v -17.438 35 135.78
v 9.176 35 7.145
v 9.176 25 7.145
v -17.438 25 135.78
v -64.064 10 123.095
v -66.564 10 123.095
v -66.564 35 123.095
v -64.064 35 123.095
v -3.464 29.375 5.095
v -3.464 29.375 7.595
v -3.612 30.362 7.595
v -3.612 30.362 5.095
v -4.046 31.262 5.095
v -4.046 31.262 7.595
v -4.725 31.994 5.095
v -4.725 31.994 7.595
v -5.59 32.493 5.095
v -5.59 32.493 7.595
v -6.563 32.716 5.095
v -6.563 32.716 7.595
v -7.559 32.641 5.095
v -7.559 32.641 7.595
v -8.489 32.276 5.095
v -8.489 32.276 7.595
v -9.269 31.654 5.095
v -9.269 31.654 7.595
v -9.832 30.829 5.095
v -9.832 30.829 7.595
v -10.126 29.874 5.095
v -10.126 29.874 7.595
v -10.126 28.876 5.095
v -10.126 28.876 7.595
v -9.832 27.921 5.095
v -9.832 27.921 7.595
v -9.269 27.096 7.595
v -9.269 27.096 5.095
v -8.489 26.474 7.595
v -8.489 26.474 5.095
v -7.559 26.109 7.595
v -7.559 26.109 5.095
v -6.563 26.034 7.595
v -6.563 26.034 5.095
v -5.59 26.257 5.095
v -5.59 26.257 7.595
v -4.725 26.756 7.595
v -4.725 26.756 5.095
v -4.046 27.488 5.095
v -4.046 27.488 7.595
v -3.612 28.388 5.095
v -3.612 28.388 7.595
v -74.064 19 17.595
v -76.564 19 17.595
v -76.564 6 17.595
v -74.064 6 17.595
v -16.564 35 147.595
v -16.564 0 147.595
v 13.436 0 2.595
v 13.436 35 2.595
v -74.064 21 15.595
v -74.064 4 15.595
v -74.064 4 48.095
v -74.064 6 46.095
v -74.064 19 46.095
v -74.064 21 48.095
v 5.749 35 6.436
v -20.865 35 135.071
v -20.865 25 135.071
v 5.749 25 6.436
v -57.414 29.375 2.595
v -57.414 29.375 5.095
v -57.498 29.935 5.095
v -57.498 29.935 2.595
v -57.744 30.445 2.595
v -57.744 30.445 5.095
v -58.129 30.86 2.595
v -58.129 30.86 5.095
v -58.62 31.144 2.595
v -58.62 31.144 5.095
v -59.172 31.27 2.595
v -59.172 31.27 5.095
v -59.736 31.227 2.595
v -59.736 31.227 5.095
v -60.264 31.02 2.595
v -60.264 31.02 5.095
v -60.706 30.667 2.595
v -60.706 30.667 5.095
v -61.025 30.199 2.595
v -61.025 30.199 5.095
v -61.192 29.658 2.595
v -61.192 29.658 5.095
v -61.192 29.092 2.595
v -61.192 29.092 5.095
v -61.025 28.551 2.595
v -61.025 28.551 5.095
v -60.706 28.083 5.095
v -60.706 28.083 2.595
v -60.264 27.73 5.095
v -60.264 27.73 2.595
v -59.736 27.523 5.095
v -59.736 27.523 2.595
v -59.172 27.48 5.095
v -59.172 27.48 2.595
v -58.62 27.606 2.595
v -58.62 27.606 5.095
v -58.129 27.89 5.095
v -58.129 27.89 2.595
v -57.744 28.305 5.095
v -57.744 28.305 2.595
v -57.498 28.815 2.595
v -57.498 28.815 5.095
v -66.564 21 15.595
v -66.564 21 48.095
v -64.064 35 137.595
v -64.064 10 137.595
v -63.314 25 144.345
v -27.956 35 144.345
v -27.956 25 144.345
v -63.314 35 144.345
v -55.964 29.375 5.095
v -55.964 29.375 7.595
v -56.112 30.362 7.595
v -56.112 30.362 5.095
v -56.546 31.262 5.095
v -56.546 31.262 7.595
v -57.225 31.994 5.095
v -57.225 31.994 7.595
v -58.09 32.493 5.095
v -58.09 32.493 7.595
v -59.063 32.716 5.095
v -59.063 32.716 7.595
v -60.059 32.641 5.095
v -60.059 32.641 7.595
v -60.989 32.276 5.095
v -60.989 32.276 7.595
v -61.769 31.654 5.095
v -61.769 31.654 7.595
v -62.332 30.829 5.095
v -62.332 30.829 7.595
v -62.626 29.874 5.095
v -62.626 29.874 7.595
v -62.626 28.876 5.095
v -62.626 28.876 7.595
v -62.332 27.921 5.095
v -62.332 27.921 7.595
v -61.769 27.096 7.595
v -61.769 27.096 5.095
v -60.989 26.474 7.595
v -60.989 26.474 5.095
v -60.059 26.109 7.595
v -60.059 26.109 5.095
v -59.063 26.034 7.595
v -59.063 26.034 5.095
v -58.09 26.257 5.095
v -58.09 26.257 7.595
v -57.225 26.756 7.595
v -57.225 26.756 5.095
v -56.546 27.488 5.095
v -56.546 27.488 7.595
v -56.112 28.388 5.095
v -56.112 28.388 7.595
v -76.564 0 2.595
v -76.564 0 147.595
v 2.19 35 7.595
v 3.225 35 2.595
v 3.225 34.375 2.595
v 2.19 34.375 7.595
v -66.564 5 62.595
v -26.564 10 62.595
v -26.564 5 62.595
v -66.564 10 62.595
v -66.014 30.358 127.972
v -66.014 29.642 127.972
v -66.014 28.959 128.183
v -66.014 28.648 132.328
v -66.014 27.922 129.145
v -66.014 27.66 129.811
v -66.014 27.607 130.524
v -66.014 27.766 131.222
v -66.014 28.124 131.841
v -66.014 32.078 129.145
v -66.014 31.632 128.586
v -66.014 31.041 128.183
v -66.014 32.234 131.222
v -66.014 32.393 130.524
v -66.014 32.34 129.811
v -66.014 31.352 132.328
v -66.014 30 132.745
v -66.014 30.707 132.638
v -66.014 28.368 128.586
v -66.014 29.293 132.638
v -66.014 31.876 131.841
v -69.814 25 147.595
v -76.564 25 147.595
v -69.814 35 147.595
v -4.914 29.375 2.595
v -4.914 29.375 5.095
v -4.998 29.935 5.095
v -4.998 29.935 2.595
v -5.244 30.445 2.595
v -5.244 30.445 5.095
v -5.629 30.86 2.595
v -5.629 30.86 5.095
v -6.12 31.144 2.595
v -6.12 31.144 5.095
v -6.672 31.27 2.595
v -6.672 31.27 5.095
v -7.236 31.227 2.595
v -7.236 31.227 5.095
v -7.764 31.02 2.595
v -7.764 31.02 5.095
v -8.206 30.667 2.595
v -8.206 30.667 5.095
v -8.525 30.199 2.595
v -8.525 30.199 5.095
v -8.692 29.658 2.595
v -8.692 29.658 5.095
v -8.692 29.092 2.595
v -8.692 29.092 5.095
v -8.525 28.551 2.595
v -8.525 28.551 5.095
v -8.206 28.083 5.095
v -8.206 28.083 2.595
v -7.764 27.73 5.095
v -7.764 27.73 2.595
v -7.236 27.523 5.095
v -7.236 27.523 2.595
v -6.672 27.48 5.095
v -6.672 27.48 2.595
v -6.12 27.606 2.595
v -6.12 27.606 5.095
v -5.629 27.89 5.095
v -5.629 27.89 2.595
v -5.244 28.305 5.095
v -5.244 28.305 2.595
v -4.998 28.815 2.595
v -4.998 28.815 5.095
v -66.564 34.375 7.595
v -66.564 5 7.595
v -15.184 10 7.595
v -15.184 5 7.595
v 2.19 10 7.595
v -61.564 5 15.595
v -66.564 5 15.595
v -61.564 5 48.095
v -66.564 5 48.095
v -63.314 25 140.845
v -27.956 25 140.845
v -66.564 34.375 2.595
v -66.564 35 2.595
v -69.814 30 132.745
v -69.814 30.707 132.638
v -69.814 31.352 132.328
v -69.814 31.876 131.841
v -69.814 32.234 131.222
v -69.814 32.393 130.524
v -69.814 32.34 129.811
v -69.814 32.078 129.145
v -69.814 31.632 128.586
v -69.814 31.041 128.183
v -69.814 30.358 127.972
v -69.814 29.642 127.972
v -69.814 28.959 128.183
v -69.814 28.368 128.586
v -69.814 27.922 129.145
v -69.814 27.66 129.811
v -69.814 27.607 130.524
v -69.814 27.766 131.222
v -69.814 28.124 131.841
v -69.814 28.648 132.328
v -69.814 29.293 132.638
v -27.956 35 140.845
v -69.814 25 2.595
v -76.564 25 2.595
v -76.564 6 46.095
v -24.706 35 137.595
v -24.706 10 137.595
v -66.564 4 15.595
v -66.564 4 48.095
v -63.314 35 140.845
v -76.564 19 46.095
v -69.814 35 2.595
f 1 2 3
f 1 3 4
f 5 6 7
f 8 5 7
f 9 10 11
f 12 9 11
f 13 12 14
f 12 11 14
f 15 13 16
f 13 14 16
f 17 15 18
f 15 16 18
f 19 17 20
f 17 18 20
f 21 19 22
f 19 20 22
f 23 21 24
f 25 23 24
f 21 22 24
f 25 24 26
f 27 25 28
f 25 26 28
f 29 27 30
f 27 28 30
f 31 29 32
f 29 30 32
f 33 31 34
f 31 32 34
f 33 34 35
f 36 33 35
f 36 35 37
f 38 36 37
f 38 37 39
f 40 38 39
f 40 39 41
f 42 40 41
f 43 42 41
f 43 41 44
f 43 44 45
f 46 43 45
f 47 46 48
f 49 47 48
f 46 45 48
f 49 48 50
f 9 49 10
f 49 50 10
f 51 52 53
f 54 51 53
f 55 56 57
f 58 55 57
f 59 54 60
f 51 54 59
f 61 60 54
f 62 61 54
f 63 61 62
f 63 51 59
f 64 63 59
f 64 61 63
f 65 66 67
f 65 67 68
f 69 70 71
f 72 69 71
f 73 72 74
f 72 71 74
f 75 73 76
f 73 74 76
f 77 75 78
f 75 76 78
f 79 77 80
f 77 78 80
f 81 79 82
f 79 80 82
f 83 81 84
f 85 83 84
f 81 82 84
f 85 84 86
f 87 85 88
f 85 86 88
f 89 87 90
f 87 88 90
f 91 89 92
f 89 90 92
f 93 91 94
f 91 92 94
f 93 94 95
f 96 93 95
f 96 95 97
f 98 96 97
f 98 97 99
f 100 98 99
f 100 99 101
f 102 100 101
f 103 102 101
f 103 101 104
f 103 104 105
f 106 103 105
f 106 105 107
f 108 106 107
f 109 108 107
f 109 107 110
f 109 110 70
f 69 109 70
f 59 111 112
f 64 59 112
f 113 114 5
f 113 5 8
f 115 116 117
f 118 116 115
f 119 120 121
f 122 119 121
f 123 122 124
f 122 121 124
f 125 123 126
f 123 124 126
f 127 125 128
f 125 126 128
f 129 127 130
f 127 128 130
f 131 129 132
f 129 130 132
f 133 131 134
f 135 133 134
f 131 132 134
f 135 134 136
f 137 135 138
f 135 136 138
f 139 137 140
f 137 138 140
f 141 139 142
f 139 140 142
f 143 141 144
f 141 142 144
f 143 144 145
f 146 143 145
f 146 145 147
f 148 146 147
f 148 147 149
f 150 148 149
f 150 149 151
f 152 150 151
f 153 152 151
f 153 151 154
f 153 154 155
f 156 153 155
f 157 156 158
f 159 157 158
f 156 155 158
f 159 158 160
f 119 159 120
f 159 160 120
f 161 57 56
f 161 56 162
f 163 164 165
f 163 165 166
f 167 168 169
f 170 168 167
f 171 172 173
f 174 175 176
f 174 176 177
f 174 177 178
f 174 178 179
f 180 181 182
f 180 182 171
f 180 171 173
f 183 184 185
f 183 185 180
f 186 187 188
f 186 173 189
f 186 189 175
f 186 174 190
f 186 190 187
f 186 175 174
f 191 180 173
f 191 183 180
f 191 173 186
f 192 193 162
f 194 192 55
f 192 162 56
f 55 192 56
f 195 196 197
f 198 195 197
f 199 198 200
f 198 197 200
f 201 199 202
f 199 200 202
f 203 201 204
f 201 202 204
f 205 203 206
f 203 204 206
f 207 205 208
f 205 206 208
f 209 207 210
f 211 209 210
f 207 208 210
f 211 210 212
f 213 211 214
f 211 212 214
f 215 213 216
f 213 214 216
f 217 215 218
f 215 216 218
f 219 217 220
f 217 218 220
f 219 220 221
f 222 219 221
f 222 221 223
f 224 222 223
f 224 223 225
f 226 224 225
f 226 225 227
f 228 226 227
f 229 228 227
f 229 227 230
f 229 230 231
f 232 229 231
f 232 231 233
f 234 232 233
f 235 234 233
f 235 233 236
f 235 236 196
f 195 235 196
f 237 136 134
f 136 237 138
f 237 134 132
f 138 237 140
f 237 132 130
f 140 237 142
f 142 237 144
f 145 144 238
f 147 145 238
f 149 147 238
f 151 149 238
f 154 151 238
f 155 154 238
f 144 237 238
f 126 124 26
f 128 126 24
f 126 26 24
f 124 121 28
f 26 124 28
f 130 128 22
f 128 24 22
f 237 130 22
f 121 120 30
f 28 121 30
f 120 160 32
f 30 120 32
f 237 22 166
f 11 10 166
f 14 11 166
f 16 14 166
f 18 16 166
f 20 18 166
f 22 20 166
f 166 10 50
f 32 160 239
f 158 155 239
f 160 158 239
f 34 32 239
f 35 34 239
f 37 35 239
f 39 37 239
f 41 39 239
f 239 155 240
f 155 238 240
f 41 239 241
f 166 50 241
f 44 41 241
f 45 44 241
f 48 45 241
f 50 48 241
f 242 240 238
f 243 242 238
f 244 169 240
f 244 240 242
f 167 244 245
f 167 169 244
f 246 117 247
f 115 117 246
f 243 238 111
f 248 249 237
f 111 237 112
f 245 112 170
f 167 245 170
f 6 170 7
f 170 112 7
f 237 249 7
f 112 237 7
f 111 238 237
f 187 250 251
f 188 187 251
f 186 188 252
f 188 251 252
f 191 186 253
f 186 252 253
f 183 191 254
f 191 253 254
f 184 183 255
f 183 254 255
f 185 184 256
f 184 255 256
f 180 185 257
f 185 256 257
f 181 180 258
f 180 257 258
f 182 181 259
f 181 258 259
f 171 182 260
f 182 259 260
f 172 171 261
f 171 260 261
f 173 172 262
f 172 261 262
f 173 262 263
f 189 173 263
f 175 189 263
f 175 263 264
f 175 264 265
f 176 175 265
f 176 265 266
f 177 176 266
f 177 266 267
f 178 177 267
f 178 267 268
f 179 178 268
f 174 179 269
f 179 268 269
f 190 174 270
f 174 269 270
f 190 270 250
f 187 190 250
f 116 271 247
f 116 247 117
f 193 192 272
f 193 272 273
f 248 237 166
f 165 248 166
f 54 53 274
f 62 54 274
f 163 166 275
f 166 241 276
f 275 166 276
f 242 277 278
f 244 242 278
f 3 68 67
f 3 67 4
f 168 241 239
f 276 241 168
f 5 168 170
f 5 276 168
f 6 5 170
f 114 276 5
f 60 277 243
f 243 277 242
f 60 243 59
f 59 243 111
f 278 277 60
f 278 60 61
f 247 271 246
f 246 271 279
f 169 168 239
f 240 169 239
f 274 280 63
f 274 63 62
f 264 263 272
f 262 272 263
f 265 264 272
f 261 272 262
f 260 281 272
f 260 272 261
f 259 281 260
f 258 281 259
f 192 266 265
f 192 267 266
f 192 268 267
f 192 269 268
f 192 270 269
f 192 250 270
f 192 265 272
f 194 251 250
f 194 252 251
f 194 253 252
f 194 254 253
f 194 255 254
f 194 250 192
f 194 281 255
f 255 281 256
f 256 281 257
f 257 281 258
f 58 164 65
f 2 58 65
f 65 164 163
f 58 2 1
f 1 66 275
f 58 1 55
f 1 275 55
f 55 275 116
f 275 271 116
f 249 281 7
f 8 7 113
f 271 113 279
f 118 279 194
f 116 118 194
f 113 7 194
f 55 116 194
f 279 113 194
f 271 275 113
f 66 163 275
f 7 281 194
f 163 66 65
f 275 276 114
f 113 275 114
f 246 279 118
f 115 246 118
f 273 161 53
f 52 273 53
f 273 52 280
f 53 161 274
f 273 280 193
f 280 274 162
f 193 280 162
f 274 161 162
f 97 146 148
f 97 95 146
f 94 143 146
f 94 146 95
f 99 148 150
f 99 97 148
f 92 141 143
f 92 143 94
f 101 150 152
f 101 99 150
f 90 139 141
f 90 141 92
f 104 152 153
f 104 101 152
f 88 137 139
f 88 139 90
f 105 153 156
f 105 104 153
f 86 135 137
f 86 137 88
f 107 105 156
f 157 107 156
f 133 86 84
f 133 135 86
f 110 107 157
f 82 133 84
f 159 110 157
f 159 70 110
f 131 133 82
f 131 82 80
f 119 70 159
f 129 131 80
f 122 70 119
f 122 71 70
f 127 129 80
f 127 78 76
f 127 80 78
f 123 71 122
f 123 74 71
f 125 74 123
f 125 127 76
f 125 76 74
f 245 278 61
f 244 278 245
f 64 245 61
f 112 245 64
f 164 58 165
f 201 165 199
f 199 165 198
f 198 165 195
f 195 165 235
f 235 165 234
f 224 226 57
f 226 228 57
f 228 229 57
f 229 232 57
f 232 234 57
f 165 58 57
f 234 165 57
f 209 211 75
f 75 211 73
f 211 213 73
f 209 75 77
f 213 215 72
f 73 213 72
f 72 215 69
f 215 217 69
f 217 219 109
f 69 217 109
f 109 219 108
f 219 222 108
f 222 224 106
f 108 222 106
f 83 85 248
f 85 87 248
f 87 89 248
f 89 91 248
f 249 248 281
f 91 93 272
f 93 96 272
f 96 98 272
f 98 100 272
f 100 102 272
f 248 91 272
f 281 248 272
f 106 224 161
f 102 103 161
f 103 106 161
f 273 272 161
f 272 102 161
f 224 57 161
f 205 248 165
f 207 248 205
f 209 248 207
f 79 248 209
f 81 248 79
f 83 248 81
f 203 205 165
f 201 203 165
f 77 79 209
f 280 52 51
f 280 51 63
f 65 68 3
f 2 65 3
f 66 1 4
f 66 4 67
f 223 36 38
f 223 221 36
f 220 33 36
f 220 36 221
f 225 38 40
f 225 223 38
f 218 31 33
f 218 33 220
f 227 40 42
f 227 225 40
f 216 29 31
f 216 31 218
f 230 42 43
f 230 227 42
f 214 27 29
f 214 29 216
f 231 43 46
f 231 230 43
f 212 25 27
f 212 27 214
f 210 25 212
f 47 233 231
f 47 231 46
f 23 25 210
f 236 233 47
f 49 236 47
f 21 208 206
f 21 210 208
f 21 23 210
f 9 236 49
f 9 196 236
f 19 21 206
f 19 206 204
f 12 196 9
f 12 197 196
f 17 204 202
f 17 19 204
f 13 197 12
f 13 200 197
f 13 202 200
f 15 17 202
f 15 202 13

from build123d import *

# Parameters (mm, degrees)
BOSS_EXTRUDE1_DEPTH = 35
BOSS_EXTRUDE2_DEPTH = 10
SKETCH4_W           = 35.357177314
SKETCH4_H           = 3.5
CUT_EXTRUDE1_DEPTH  = 10
SKETCH5_W           = 68.753729038
SKETCH5_H           = 5
CUT_EXTRUDE2_DEPTH  = 0.625
CUT_EXTRUDE3_REACH  = 165.362
SKETCH6_R           = 1.9
SKETCH7_R           = 3.35
CUT_EXTRUDE4_DEPTH  = 2.5
LPATTERN1_COUNT     = 2
LPATTERN1_PITCH     = 52.5
SKETCH8_W           = 3.5
SKETCH8_H           = 145
SKETCH8_W_2         = 3.25
CUT_EXTRUDE5_DEPTH  = 10
SKETCH10_W          = 40
SKETCH10_H          = 55
CUT_EXTRUDE6_DEPTH  = 5
CUT_EXTRUDE7_REACH  = 178.378
SKETCH9_W           = 13
SKETCH9_H           = 28.5
SKETCH11_W          = 17
SKETCH11_H          = 32.5
SKETCH11_W_2        = 13
SKETCH11_H_2        = 28.5
CUT_EXTRUDE8_DEPTH  = 7.5
CHAMFER1_SIZE2      = 1
CHAMFER1_SIZE       = 5
SKETCH14_W          = 25
SKETCH14_H          = 14.5
BOSS_EXTRUDE3_DEPTH = 2.5
SKETCH13_R          = 2.4
CUT_EXTRUDE9_DEPTH  = 3.8


with BuildPart() as part:
    # Sketch1 → Boss-Extrude1 (new body)
    with BuildSketch(Plane(origin=(0, 0, 0), x_dir=(-1, 0, 0), z_dir=(0, 1, 0))):
        Polygon((66.563657866, 147.59508075), (16.563657866, 147.59508075), (26.356262061, 145.56902471), (24.706480552, 137.59508075), (66.563657866, 137.59508075), align=None)
        Polygon((26.356262061, 145.56902471), (16.563657866, 147.59508075), (16.563657866, 137.59508075), (24.706480552, 137.59508075), align=None)
        Polygon((16.563657866, 147.59508075), (-13.436342134, 2.59508075), (-8.436342134, 2.59508075), (-3.224553931, 2.59508075), (-3.224553931, 7.59508075), (-2.190071172, 7.59508075), (24.706480552, 137.59508075), (16.563657866, 137.59508075), align=None)
        Polygon((76.563657866, 147.59508075), (66.563657866, 147.59508075), (66.563657866, 137.59508075), (66.563657866, 7.59508075), (66.563657866, 2.59508075), (76.563657866, 2.59508075), align=None)
        Polygon((-3.224553931, 7.59508075), (-3.224553931, 2.59508075), (-2.190071172, 7.59508075), align=None)
        Polygon((-2.190071172, 7.59508075), (-3.224553931, 2.59508075), (66.563657866, 2.59508075), (66.563657866, 7.59508075), align=None)
    extrude(amount=BOSS_EXTRUDE1_DEPTH)

    # Sketch3 → Boss-Extrude2 (add)
    with BuildSketch(Plane.XZ):
        Polygon((-76.563657866, 147.59508075), (-16.563657866, 147.59508075), (13.436342134, 2.59508075), (-76.563657866, 2.59508075), align=None)
    extrude(amount=-BOSS_EXTRUDE2_DEPTH)

    # Sketch4 → Cut-Extrude1 (cut)
    with BuildSketch(Plane(origin=(0, 35, 0), x_dir=(-1, 0, 0), z_dir=(0, 1, 0))):
        Polygon((20.865415976, 135.0709526), (-5.748682081, 6.436145326), (-9.176093549, 7.145264941), (17.438004507, 135.780072214), align=None)
        with Locations((45.635069209, 142.59508075)):
            Rectangle(SKETCH4_W, SKETCH4_H)
    extrude(amount=-CUT_EXTRUDE1_DEPTH, mode=Mode.SUBTRACT)

    # Sketch5 → Cut-Extrude2 (cut)
    with BuildSketch(Plane(origin=(0, 35, -3.02991925), x_dir=(1, 0, 0), z_dir=(0, -1, 0))):
        Polygon((3.224553931, 5.625), (2.190071172, 10.625), (2.190071172, 5.625), align=None)
        with Locations((-32.186793347, 8.125)):
            Rectangle(SKETCH5_W, SKETCH5_H)
    extrude(amount=CUT_EXTRUDE2_DEPTH, mode=Mode.SUBTRACT)

    # Sketch6 → Cut-Extrude3 (cut, up to next)
    with BuildSketch(Plane.XY.offset(7.59508075), mode=Mode.PRIVATE) as cut_extrude3_sk1:
        with Locations((-59.313657866, 29.375)):
            Circle(SKETCH6_R)
    cut_extrude3_tool1 = extrude(cut_extrude3_sk1.sketch, amount=-CUT_EXTRUDE3_REACH, mode=Mode.PRIVATE) & part.part
    cut_extrude3 = cut_extrude3_tool1.solids().sort_by_distance((-59.313658, 29.375, 7.595081))[0]
    add(cut_extrude3, mode=Mode.SUBTRACT)

    # Sketch7 → Cut-Extrude4 (cut)
    with BuildSketch(Plane.XY.offset(7.59508075)):
        with Locations((-59.313657866, 29.375)):
            Circle(SKETCH7_R)
    cut_extrude4 = extrude(amount=-CUT_EXTRUDE4_DEPTH, mode=Mode.SUBTRACT)

    # LPattern1: Cut-Extrude3, Cut-Extrude4 ×2
    with Locations(*[(i * LPATTERN1_PITCH, 0, 0) for i in range(1, LPATTERN1_COUNT)]):
        add(cut_extrude3, mode=Mode.SUBTRACT)
        add(cut_extrude4, mode=Mode.SUBTRACT)

    # Sketch8 → Cut-Extrude5 (cut)
    with BuildSketch(Plane(origin=(0, 35, 0), x_dir=(-1, 0, 0), z_dir=(0, 1, 0))):
        with Locations((71.563657866, 75.09508075)):
            Rectangle(SKETCH8_W, SKETCH8_H)
        with Locations((74.938657866, 75.09508075)):
            Rectangle(SKETCH8_W_2, SKETCH8_H)
    extrude(amount=-CUT_EXTRUDE5_DEPTH, mode=Mode.SUBTRACT)

    # Sketch10 → Cut-Extrude6 (cut)
    with BuildSketch(Plane(origin=(0, 10, 0), x_dir=(-1, 0, 0), z_dir=(0, 1, 0))):
        Polygon((15.184347521, 7.59508075), (26.563657866, 7.59508075), (26.563657866, 62.59508075), align=None)
        with Locations((46.563657866, 35.09508075)):
            Rectangle(SKETCH10_W, SKETCH10_H)
    extrude(amount=-CUT_EXTRUDE6_DEPTH, mode=Mode.SUBTRACT)

    # Sketch9 → Cut-Extrude7 (cut, up to next)
    with BuildSketch(Plane(origin=(-76.563657866, 0, 0), x_dir=(0, -1, 0), z_dir=(-1, 0, 0)), mode=Mode.PRIVATE) as cut_extrude7_sk1:
        with Locations((-12.5, 31.84508075)):
            Rectangle(SKETCH9_W, SKETCH9_H)
    cut_extrude7_tool1 = extrude(cut_extrude7_sk1.sketch, amount=-CUT_EXTRUDE7_REACH, mode=Mode.PRIVATE) & part.part
    add(cut_extrude7_tool1.solids().sort_by_distance((-76.563658, 12.5, 31.845081))[0], mode=Mode.SUBTRACT)

    # Sketch11 → Cut-Extrude8 (cut)
    with BuildSketch(Plane.YZ.offset(-66.563657866)):
        with Locations((12.5, 31.84508075)):
            Rectangle(SKETCH11_W, SKETCH11_H)
        with Locations((12.5, 31.84508075)):
            Rectangle(SKETCH11_W_2, SKETCH11_H_2, mode=Mode.SUBTRACT)
    extrude(amount=-CUT_EXTRUDE8_DEPTH, mode=Mode.SUBTRACT)

    # Chamfer1
    chamfer1_edges = [part.edges().sort_by_distance(p)[0] for p in [
        (-66.563657866, 5, 31.84508075),
    ]]
    chamfer1_side = [part.faces().sort_by_distance(p)[0] for p in [
        (-66.543657866, 5, 31.84508075),
    ]]
    chamfer(chamfer1_edges, length=CHAMFER1_SIZE - 0.0001, length2=CHAMFER1_SIZE2 - 0.0001, reference=chamfer1_side[0])  # a hair under: the kernel refuses the full size

    # Sketch14 → Boss-Extrude3 (add)
    with BuildSketch(Plane.YZ.offset(-66.563657866)):
        with Locations((22.5, 130.34508075)):
            Rectangle(SKETCH14_W, SKETCH14_H)
    extrude(amount=BOSS_EXTRUDE3_DEPTH)

    # Sketch13 → Cut-Extrude9 (cut)
    with BuildSketch(Plane(origin=(-69.813657866, 0, 0), x_dir=(0, -1, 0), z_dir=(-1, 0, 0))):
        with Locations(Location((-30, 130.34508075, 0), (0, 0, 90))):
            Circle(SKETCH13_R)
    extrude(amount=-CUT_EXTRUDE9_DEPTH, mode=Mode.SUBTRACT)


solid = part.part
